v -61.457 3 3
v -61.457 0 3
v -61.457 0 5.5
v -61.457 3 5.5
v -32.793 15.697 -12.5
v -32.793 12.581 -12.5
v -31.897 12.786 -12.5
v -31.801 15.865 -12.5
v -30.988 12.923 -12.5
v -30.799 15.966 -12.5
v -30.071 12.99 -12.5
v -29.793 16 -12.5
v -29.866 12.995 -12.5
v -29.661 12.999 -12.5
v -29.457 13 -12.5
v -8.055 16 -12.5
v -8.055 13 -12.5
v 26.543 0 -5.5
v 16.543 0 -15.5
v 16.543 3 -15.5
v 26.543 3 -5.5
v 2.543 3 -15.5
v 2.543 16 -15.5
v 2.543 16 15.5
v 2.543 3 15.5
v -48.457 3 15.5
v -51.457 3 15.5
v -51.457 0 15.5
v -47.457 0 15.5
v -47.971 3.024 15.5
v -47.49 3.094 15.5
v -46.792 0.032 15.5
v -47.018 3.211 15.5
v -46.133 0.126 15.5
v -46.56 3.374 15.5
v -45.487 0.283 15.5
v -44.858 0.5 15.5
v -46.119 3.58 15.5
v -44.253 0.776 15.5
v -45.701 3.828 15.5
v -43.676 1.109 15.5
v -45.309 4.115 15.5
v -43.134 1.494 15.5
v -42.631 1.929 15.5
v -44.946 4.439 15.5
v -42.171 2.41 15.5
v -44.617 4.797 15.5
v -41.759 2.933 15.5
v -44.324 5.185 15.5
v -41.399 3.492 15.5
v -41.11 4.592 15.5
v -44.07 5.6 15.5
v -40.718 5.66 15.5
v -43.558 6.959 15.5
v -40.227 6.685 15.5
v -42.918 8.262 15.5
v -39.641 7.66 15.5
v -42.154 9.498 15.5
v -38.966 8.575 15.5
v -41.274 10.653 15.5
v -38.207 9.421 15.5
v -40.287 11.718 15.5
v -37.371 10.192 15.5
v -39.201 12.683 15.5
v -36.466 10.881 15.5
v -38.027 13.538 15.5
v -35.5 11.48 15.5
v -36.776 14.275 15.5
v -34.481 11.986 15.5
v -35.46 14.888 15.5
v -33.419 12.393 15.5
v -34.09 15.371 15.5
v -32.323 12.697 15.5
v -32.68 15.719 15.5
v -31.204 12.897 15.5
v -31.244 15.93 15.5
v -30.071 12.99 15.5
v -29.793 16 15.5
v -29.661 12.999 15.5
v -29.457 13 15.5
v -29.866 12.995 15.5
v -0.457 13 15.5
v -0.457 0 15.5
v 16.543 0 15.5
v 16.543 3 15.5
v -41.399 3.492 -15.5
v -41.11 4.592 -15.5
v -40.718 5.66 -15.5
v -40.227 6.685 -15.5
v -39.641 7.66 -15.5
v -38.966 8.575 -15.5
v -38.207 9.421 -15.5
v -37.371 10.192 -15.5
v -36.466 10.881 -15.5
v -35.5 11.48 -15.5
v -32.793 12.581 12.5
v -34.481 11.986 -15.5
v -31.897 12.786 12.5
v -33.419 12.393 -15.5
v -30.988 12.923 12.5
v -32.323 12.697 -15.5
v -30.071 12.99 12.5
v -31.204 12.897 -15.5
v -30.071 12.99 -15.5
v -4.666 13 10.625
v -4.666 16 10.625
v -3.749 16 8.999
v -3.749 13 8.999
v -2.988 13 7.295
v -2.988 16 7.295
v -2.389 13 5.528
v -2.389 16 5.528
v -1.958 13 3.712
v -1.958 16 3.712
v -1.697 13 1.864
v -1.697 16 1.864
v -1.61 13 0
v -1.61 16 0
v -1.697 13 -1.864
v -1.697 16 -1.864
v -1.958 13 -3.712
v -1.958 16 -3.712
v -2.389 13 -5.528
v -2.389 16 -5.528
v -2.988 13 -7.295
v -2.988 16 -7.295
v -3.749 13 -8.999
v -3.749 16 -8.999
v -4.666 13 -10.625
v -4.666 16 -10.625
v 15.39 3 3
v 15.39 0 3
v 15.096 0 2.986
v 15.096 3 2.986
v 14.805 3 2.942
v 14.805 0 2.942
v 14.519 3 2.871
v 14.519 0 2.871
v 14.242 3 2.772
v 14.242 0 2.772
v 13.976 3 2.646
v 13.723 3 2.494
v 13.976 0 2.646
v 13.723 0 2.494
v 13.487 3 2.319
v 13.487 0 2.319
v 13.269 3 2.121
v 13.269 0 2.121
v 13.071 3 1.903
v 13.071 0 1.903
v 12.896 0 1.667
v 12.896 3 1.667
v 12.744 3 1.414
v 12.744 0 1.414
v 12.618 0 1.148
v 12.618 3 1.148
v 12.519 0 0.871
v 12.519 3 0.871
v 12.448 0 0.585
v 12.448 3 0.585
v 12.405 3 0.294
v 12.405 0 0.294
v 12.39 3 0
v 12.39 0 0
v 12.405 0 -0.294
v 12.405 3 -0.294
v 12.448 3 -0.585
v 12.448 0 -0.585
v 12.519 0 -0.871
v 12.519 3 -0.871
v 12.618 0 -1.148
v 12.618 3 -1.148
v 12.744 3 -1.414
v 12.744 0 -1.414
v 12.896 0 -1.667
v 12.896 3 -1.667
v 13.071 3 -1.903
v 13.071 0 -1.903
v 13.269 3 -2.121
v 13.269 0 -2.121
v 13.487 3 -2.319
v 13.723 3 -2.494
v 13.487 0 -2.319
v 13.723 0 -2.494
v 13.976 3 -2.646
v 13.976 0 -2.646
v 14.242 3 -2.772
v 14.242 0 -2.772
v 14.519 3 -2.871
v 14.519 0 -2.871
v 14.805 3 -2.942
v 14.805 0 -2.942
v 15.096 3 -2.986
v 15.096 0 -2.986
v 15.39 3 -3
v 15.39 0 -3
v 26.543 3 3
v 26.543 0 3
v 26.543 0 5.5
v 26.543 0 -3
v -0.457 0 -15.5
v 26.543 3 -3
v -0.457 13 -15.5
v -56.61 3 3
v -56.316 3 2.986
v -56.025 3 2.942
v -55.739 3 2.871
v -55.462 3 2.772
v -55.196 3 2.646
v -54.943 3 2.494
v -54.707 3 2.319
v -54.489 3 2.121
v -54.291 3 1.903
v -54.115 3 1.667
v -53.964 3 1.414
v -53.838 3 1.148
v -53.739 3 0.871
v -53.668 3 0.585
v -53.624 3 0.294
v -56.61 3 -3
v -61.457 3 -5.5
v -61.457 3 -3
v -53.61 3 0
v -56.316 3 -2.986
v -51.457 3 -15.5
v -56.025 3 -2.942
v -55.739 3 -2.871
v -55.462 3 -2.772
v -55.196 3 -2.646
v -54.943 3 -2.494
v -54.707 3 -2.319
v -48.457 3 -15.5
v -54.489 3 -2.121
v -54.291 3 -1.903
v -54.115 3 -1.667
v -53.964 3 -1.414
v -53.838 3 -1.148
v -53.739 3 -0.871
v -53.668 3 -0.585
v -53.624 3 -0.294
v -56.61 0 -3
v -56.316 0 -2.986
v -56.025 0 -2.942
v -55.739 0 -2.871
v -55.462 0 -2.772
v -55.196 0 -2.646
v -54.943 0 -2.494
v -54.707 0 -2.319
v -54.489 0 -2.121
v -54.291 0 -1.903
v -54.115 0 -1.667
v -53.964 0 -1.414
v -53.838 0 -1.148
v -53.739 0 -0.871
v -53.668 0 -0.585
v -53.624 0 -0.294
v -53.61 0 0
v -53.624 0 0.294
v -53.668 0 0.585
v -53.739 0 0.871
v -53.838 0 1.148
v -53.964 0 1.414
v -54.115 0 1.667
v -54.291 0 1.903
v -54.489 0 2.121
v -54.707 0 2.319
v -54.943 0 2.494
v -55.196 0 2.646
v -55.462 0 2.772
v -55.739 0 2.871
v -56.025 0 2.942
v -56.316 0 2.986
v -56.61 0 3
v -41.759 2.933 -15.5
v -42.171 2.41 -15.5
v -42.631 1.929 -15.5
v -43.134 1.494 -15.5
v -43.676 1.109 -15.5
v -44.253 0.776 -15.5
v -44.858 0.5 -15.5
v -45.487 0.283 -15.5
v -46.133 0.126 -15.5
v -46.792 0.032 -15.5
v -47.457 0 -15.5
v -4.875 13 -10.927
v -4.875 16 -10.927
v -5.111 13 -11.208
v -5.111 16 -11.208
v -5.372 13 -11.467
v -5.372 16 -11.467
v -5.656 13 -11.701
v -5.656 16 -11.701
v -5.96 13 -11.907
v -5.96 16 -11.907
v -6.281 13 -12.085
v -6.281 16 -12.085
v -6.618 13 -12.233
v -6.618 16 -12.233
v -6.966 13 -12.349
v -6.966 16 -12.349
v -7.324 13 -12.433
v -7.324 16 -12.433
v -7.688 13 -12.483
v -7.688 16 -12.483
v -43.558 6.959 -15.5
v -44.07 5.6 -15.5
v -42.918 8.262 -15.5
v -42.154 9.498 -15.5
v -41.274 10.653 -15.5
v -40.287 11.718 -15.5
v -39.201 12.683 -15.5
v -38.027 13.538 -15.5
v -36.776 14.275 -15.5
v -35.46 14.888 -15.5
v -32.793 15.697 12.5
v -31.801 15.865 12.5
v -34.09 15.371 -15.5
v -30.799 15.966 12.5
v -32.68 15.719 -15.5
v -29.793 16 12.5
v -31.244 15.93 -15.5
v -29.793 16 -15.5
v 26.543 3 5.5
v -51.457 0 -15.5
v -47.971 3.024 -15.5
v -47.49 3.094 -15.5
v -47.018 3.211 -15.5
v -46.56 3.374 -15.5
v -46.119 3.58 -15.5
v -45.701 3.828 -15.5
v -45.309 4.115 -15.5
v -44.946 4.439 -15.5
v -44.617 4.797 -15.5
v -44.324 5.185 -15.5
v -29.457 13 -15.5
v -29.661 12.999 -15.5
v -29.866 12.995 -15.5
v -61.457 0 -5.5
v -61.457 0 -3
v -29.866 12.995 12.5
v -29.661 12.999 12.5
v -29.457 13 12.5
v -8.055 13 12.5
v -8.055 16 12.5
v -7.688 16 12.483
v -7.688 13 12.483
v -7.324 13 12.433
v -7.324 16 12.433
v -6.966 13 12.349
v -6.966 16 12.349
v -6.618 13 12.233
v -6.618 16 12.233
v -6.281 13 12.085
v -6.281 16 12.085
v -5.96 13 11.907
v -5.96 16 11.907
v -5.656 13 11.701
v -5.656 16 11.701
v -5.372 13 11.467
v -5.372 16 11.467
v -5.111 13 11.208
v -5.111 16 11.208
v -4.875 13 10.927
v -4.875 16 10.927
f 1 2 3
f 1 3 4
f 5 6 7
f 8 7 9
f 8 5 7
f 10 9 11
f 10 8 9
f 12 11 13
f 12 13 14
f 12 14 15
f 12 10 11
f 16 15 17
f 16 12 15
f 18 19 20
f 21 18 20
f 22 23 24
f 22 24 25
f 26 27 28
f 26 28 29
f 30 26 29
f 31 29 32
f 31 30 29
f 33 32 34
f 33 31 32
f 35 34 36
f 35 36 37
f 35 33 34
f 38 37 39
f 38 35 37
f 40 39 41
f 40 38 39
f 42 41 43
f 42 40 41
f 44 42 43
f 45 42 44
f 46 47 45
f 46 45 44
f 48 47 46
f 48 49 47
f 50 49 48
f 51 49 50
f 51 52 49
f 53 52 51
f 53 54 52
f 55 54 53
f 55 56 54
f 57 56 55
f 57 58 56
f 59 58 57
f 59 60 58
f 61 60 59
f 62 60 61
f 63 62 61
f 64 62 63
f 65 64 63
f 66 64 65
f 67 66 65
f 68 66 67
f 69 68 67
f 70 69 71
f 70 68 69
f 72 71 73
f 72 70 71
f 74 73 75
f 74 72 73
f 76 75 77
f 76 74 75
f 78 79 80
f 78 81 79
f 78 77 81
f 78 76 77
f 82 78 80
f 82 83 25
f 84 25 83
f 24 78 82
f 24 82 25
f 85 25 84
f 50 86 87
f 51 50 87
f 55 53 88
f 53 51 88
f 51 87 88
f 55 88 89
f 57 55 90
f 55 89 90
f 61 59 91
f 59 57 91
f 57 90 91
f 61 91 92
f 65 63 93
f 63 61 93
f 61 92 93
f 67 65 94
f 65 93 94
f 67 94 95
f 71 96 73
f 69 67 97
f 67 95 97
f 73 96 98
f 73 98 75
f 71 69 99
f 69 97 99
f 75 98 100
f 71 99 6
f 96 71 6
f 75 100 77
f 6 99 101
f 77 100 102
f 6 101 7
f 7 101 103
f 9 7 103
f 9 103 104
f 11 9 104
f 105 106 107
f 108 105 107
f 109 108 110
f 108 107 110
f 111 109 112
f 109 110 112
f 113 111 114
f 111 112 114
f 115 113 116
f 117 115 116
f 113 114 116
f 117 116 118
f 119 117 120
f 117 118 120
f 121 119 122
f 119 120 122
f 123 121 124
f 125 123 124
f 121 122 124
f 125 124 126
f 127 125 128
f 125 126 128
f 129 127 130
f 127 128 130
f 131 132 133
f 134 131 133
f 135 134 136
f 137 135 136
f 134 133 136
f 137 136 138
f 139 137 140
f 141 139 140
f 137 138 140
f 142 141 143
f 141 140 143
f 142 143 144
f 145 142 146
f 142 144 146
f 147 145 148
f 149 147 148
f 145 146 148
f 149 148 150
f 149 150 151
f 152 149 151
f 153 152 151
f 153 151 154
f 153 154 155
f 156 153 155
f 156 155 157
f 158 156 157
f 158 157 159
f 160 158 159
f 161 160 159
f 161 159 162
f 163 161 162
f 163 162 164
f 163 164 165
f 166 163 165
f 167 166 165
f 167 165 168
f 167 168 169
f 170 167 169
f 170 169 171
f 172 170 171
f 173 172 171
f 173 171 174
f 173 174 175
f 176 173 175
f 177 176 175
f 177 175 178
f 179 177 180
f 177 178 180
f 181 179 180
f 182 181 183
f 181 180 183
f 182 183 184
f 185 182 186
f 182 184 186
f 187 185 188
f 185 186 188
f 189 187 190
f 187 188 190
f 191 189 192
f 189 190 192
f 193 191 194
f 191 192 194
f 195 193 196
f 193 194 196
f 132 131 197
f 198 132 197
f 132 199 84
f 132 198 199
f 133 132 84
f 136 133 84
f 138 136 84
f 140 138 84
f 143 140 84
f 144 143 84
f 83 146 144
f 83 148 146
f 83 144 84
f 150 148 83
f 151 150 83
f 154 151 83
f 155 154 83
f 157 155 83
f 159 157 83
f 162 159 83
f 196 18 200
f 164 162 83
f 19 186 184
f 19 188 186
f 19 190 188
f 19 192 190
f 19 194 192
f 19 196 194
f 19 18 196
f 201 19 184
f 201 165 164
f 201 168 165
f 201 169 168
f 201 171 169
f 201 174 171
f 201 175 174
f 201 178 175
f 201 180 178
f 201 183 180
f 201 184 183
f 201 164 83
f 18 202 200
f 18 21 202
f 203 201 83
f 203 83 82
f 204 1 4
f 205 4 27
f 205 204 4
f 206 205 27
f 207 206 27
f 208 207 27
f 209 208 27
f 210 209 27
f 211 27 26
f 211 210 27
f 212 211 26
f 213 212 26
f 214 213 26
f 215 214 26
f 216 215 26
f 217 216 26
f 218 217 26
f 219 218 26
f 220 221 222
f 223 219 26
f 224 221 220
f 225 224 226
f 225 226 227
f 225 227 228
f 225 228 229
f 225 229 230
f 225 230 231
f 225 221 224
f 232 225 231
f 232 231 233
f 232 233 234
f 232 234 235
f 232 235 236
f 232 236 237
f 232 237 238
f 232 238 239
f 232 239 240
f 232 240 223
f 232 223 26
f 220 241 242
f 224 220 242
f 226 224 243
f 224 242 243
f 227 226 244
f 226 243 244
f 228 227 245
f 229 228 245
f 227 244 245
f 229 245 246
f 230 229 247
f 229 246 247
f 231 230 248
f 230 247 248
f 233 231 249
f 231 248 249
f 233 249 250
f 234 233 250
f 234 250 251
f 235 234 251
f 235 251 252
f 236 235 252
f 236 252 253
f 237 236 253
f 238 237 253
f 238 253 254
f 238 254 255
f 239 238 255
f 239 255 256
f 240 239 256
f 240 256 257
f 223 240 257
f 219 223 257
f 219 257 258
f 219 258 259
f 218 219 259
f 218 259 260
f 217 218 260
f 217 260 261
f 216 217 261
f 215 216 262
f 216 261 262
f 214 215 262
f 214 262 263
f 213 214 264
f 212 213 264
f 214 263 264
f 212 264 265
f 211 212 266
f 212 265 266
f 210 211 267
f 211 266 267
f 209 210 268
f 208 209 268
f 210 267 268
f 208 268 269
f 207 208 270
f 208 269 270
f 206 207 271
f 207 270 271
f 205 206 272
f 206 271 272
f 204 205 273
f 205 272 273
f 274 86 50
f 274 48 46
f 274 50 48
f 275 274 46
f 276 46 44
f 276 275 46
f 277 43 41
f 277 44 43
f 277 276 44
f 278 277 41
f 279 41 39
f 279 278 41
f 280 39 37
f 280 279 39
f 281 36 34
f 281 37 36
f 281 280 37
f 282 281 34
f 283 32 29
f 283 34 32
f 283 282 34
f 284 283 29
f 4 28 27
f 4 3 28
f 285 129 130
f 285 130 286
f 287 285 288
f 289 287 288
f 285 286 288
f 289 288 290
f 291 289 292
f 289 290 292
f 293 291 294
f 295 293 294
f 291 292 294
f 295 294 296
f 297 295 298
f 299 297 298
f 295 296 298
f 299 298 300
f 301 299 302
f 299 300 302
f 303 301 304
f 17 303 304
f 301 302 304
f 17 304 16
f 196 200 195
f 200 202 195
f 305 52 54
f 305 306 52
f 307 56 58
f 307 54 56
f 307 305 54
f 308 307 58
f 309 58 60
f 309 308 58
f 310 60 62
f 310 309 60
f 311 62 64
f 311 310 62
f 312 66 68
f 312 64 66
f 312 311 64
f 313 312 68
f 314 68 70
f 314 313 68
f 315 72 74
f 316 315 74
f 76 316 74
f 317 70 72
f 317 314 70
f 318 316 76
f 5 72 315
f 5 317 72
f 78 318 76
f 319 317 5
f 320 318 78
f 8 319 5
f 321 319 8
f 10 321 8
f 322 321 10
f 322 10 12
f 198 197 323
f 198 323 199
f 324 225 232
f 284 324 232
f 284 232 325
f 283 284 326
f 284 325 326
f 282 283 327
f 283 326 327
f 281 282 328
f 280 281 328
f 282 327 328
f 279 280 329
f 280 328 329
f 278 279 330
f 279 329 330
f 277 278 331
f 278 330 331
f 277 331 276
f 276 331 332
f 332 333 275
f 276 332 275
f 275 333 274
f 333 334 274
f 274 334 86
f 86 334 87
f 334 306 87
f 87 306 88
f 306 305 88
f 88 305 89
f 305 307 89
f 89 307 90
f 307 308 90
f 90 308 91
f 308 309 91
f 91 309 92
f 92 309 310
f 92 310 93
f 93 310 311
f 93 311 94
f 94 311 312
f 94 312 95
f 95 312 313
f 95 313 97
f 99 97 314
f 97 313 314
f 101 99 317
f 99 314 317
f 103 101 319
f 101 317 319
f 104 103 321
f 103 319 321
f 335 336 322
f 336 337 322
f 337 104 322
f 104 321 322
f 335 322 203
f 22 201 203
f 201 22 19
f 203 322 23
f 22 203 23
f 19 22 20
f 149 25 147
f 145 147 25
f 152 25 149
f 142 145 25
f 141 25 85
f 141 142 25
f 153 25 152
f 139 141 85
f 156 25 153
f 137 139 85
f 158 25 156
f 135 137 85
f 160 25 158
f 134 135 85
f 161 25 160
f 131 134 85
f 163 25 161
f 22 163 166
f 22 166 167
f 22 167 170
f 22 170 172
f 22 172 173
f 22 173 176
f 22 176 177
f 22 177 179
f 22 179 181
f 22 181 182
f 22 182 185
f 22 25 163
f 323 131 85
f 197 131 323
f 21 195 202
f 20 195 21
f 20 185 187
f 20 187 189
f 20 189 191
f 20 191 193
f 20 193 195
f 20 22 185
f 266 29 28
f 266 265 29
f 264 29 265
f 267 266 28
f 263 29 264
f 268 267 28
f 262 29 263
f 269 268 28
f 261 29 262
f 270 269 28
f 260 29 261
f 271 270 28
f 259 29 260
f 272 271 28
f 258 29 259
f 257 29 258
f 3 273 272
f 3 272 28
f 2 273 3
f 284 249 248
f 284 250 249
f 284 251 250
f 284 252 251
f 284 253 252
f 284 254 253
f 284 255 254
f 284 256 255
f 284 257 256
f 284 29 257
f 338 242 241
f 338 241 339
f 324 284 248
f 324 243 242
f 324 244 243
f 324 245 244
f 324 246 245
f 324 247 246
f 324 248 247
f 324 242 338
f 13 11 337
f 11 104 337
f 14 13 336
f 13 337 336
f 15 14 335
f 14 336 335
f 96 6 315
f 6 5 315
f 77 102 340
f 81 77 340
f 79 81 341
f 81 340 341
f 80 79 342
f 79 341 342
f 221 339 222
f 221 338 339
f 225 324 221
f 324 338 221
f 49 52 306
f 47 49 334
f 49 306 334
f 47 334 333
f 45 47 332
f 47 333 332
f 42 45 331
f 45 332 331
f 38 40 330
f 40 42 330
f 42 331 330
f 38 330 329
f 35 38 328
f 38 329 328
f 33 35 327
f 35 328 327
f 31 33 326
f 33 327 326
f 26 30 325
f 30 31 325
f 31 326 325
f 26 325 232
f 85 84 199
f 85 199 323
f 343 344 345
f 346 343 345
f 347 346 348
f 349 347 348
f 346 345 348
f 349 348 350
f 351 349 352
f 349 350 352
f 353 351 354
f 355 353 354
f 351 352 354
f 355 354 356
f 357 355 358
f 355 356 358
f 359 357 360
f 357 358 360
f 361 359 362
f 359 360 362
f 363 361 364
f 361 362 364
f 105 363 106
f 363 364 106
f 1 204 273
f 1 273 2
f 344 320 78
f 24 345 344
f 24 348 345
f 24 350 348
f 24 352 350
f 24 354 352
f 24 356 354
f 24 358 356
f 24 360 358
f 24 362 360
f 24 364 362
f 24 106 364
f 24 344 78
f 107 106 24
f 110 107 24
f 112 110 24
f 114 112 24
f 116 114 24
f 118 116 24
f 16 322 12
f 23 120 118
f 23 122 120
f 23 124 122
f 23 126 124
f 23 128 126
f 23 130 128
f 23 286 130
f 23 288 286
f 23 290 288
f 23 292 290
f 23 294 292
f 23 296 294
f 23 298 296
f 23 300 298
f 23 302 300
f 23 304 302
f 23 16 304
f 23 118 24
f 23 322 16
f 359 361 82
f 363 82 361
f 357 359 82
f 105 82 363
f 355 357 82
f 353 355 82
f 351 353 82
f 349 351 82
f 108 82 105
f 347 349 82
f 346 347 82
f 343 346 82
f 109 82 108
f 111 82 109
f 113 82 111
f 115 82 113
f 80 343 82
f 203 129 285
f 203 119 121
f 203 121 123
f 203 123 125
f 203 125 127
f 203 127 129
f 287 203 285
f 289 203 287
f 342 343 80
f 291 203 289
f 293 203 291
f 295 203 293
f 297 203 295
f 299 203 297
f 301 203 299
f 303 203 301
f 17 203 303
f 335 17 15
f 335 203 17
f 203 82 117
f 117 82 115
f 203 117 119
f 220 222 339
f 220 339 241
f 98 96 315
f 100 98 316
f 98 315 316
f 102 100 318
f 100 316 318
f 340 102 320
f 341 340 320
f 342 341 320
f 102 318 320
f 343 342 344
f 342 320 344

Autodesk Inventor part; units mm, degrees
ref_plane "YZ Plane" through (0, 0, 0) normal (1, 0, 0) x (0, 1, 0)
ref_plane "XZ Plane" through (0, 0, 0) normal (0, 1, 0) x (-1, 0, 0)
ref_plane "XY Plane" through (0, 0, 0) normal (0, 0, 1) x (1, 0, 0)
sketch "Sketch8" plane through (0, 0, 0) normal (0, 0, 1) x (1, 0, 0)
  line L0 (26.5434, 0) -> (-0.4566, 0)
  line L1 (-0.4566, 0) -> (-0.4566, 13)
  line L2 (-47.4566, 0) -> (-61.4566, 0)
  line L3 (-61.4566, 3) -> (-48.4566, 3)
  line L4 (-29.793, 16) -> (2.5434, 16)
  line L5 (2.5434, 16) -> (2.5434, 3)
  line L6 (2.5434, 3) -> (26.5434, 3)
  line L7 (-61.4566, 0) -> (-61.4566, 3)
  line L8 (26.5434, 3) -> (26.5434, 0)
  line L9 (-29.4566, 30.4084) -> (-29.4566, -16.4271)
  arc A0 (-29.4566, 13) -> (-30.0706, 12.9895) centre (-29.4566, -5) ccw
  arc A1 (-30.0706, 12.9895) -> (-41.3988, 3.4923) centre (-29.6612, 0.9965) ccw
  arc A2 (-48.4566, 3) -> (-44.0702, 5.6) centre (-48.4566, 8) ccw
  line L10 (-0.4566, 13) -> (-29.4566, 13)
  arc A3 (-47.4566, 0) -> (-41.3988, 3.4923) centre (-47.4566, 7) ccw
  arc A4 (-29.793, 16) -> (-44.0702, 5.6) centre (-29.793, 1) ccw
  point P0 (0, 0)
  point P1 (-36.7292, 11.4654)
  point P2 (-29.4566, -11.7979)
  dimension "d92" = 88
  dimension "d93" = 27
  dimension "d95" = 16
  dimension "d100" = 3
  dimension "d101" = 3
  dimension "d104" = 14
  dimension "d105" = 13
  dimension "d106" = 32
  dimension "d109" = 5
  dimension "d111" = 12
  dimension "d112" = 7
  dimension "d113" = 3
  dimension "d114" = 15
extrude "Extrusion8" add sketch "Sketch8" along normal mid plane 31
sketch "Sketch9" plane through (-29.793, 16, 15.5) normal (0, 1, 0) x (1, 0, 0)
  line L0 (0, 0) -> (0, 31) projected
  line L1 (32.3364, 0) -> (0, 0) projected
  line L2 (0, 31) -> (32.3364, 31) projected
  arc A0 (8.6831, 6.377) -> (8.6831, 24.0275) centre (7.7775, 15.2022) ccw construction
  line L3 (-3, 28) -> (-3, 3)
  line L4 (-3, 28) -> (21.7382, 28)
  line L5 (-3, 3) -> (21.7382, 3)
  arc A1 (25.1271, 4.875) -> (25.1271, 26.125) centre (8.1828, 15.5) ccw
  arc A2 (25.1271, 26.125) -> (21.7382, 28) centre (21.7382, 24) ccw
  arc A3 (21.7382, 3) -> (25.1271, 4.875) centre (21.7382, 7) ccw
  point P0 (29.793, 15.5)
  point P1 (23.7953, 28)
  point P2 (23.7953, 3)
  dimension "d115" = 3
  dimension "d116" = 3
  dimension "d117" = 3
  dimension "d118" = 20
  dimension "d119" = 4
extrude "Extrusion9" cut sketch "Sketch9" against normal blind 4
sketch "Sketch10" plane through (2.5434, 3, 15.5) normal (0, 1, 0) x (1, 0, 0)
  line L0 (24, 0) -> (24, 31) projected
  line L1 (0, 31) -> (24, 31) projected
  circle A0 centre (12.8467, 12.1299) radius 2.4585 projected
  circle A1 centre (-59.1533, 12.1299) radius 2.4585 projected
  line L2 (24, 15.5) -> (-63.997, 15.5) construction
  line L3 (12.8467, 12.1299) -> (12.8467, 22.8922)
  line L4 (-59.1533, 12.1299) -> (-59.1533, 22.8922)
  point P0 (-2.5434, 15.5)
  point P1 (-59.1533, 15.5)
  point P2 (12.8467, 15.5)
hole "Hole1" at (-56.6099, 3, 0) at (15.3901, 3, 0) direction (0, -1, 0) diameter 6 depth 5 tip angle 118
sketch "Sketch11" plane through (2.5434, 3, 15.5) normal (0, 1, 0) x (1, 0, 0)
  circle A0 centre (12.8467, 15.5) radius 3 projected
  line L0 (24, 0) -> (0, 0) projected
  line L1 (12.8467, 15.5) -> (37.9107, 15.5) construction
  line L2 (12.8467, 12.5) -> (37.9107, 12.5)
  line L3 (37.9107, 18.5) -> (12.8467, 18.5)
  arc A1 (12.8467, 18.5) -> (12.8467, 12.5) centre (12.8467, 15.5) ccw
  arc A2 (37.9107, 12.5) -> (37.9107, 18.5) centre (37.9107, 15.5) ccw
  circle A3 centre (-59.1533, 15.5) radius 3 projected
  line L4 (-59.1533, 15.5) -> (-73.4296, 15.5) construction
  line L5 (-59.1533, 12.5) -> (-73.4296, 12.5)
  line L6 (-73.4296, 18.5) -> (-59.1533, 18.5)
  arc A4 (-59.1533, 12.5) -> (-59.1533, 18.5) centre (-59.1533, 15.5) ccw
  arc A5 (-73.4296, 18.5) -> (-73.4296, 12.5) centre (-73.4296, 15.5) ccw
  point P0 (-2.5434, 15.5)
  point P1 (25.3787, 15.5)
  point P2 (-66.2914, 15.5)
extrude "Extrusion10" cut sketch "Sketch11" against normal blind 4 contours A0 L3 A2 L2 | A3 | A3 L5 A5 L6
chamfer "Chamfer1" distance 10 angle 45 4 edges at (26.5434, 1.5, 15.5) (-61.4566, 1.5, 15.5) (-61.4566, 1.5, -15.5) (26.5434, 1.5, -15.5)
equation "\"d2\" = 0.5 * d1"
equation "\"d3\" = 0.5 * d0"
equation "\"d1\" = 33"
equation "\"d0\" = 94.155"
properties part number "SUPPORT PLSTE" material "Stainless Steel, 440C"
